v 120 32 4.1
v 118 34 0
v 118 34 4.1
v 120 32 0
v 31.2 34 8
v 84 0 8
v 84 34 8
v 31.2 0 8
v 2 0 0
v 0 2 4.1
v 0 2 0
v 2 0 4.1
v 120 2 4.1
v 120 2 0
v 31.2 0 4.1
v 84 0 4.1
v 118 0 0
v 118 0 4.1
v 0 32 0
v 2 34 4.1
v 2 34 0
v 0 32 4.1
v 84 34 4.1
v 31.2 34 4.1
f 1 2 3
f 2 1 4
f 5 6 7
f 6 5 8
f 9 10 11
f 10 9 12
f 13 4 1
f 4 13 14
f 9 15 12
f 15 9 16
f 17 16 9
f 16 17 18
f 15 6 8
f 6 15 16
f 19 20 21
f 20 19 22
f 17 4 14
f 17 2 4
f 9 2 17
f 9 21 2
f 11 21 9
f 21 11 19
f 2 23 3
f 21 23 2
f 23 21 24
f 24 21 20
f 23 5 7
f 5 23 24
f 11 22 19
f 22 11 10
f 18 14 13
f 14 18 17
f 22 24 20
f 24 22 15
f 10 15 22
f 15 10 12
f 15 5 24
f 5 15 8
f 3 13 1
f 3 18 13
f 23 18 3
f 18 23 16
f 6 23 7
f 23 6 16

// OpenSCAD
$fn = 32;

// ----------------------------------------------------------------------
// Stepped bar: centerstep, 120 x 34 x 8/4.1 mm
// ----------------------------------------------------------------------

// --- parameters (mm) ---
bar_l = 120;              // bar length, X
bar_w = 34;               // bar width, Y
plate_t = 8;              // thickness of the thick zone, Z
thin_t = 4.1;             // thickness of the thin zone
corner_c = 2;             // corner chamfer of the bar
step_cut = 3.9;           // material removed from the thin zone
thick_from = 31.2;        // start of the thick middle zone
thick_to = 84;            // end of the thick middle zone
depth_1 = 3.9;            // depth of cut 1 from the top face
depth_2 = 3.9;            // depth of cut 2 from the top face

profile = [[2, 0], [118, 0], [120, 2], [120, 32], [118, 34], [2, 34], [0, 32], [0, 2]];  // primary outline, 8 points, counter clockwise
void_1 = [[-1, -1], [31.2, -1], [31.2, 35], [-1, 35]];  // thin left end, 4 points
void_2 = [[84, -1], [121, -1], [121, 35], [84, 35]];  // thin right end, 4 points

// --- the one profile operation ---
difference() {
  linear_extrude(height = plate_t) polygon(points = profile);
  translate([0, 0, plate_t - depth_1])
    linear_extrude(height = depth_1 + 1) polygon(points = void_1);
  translate([0, 0, plate_t - depth_2])
    linear_extrude(height = depth_2 + 1) polygon(points = void_2);
}
